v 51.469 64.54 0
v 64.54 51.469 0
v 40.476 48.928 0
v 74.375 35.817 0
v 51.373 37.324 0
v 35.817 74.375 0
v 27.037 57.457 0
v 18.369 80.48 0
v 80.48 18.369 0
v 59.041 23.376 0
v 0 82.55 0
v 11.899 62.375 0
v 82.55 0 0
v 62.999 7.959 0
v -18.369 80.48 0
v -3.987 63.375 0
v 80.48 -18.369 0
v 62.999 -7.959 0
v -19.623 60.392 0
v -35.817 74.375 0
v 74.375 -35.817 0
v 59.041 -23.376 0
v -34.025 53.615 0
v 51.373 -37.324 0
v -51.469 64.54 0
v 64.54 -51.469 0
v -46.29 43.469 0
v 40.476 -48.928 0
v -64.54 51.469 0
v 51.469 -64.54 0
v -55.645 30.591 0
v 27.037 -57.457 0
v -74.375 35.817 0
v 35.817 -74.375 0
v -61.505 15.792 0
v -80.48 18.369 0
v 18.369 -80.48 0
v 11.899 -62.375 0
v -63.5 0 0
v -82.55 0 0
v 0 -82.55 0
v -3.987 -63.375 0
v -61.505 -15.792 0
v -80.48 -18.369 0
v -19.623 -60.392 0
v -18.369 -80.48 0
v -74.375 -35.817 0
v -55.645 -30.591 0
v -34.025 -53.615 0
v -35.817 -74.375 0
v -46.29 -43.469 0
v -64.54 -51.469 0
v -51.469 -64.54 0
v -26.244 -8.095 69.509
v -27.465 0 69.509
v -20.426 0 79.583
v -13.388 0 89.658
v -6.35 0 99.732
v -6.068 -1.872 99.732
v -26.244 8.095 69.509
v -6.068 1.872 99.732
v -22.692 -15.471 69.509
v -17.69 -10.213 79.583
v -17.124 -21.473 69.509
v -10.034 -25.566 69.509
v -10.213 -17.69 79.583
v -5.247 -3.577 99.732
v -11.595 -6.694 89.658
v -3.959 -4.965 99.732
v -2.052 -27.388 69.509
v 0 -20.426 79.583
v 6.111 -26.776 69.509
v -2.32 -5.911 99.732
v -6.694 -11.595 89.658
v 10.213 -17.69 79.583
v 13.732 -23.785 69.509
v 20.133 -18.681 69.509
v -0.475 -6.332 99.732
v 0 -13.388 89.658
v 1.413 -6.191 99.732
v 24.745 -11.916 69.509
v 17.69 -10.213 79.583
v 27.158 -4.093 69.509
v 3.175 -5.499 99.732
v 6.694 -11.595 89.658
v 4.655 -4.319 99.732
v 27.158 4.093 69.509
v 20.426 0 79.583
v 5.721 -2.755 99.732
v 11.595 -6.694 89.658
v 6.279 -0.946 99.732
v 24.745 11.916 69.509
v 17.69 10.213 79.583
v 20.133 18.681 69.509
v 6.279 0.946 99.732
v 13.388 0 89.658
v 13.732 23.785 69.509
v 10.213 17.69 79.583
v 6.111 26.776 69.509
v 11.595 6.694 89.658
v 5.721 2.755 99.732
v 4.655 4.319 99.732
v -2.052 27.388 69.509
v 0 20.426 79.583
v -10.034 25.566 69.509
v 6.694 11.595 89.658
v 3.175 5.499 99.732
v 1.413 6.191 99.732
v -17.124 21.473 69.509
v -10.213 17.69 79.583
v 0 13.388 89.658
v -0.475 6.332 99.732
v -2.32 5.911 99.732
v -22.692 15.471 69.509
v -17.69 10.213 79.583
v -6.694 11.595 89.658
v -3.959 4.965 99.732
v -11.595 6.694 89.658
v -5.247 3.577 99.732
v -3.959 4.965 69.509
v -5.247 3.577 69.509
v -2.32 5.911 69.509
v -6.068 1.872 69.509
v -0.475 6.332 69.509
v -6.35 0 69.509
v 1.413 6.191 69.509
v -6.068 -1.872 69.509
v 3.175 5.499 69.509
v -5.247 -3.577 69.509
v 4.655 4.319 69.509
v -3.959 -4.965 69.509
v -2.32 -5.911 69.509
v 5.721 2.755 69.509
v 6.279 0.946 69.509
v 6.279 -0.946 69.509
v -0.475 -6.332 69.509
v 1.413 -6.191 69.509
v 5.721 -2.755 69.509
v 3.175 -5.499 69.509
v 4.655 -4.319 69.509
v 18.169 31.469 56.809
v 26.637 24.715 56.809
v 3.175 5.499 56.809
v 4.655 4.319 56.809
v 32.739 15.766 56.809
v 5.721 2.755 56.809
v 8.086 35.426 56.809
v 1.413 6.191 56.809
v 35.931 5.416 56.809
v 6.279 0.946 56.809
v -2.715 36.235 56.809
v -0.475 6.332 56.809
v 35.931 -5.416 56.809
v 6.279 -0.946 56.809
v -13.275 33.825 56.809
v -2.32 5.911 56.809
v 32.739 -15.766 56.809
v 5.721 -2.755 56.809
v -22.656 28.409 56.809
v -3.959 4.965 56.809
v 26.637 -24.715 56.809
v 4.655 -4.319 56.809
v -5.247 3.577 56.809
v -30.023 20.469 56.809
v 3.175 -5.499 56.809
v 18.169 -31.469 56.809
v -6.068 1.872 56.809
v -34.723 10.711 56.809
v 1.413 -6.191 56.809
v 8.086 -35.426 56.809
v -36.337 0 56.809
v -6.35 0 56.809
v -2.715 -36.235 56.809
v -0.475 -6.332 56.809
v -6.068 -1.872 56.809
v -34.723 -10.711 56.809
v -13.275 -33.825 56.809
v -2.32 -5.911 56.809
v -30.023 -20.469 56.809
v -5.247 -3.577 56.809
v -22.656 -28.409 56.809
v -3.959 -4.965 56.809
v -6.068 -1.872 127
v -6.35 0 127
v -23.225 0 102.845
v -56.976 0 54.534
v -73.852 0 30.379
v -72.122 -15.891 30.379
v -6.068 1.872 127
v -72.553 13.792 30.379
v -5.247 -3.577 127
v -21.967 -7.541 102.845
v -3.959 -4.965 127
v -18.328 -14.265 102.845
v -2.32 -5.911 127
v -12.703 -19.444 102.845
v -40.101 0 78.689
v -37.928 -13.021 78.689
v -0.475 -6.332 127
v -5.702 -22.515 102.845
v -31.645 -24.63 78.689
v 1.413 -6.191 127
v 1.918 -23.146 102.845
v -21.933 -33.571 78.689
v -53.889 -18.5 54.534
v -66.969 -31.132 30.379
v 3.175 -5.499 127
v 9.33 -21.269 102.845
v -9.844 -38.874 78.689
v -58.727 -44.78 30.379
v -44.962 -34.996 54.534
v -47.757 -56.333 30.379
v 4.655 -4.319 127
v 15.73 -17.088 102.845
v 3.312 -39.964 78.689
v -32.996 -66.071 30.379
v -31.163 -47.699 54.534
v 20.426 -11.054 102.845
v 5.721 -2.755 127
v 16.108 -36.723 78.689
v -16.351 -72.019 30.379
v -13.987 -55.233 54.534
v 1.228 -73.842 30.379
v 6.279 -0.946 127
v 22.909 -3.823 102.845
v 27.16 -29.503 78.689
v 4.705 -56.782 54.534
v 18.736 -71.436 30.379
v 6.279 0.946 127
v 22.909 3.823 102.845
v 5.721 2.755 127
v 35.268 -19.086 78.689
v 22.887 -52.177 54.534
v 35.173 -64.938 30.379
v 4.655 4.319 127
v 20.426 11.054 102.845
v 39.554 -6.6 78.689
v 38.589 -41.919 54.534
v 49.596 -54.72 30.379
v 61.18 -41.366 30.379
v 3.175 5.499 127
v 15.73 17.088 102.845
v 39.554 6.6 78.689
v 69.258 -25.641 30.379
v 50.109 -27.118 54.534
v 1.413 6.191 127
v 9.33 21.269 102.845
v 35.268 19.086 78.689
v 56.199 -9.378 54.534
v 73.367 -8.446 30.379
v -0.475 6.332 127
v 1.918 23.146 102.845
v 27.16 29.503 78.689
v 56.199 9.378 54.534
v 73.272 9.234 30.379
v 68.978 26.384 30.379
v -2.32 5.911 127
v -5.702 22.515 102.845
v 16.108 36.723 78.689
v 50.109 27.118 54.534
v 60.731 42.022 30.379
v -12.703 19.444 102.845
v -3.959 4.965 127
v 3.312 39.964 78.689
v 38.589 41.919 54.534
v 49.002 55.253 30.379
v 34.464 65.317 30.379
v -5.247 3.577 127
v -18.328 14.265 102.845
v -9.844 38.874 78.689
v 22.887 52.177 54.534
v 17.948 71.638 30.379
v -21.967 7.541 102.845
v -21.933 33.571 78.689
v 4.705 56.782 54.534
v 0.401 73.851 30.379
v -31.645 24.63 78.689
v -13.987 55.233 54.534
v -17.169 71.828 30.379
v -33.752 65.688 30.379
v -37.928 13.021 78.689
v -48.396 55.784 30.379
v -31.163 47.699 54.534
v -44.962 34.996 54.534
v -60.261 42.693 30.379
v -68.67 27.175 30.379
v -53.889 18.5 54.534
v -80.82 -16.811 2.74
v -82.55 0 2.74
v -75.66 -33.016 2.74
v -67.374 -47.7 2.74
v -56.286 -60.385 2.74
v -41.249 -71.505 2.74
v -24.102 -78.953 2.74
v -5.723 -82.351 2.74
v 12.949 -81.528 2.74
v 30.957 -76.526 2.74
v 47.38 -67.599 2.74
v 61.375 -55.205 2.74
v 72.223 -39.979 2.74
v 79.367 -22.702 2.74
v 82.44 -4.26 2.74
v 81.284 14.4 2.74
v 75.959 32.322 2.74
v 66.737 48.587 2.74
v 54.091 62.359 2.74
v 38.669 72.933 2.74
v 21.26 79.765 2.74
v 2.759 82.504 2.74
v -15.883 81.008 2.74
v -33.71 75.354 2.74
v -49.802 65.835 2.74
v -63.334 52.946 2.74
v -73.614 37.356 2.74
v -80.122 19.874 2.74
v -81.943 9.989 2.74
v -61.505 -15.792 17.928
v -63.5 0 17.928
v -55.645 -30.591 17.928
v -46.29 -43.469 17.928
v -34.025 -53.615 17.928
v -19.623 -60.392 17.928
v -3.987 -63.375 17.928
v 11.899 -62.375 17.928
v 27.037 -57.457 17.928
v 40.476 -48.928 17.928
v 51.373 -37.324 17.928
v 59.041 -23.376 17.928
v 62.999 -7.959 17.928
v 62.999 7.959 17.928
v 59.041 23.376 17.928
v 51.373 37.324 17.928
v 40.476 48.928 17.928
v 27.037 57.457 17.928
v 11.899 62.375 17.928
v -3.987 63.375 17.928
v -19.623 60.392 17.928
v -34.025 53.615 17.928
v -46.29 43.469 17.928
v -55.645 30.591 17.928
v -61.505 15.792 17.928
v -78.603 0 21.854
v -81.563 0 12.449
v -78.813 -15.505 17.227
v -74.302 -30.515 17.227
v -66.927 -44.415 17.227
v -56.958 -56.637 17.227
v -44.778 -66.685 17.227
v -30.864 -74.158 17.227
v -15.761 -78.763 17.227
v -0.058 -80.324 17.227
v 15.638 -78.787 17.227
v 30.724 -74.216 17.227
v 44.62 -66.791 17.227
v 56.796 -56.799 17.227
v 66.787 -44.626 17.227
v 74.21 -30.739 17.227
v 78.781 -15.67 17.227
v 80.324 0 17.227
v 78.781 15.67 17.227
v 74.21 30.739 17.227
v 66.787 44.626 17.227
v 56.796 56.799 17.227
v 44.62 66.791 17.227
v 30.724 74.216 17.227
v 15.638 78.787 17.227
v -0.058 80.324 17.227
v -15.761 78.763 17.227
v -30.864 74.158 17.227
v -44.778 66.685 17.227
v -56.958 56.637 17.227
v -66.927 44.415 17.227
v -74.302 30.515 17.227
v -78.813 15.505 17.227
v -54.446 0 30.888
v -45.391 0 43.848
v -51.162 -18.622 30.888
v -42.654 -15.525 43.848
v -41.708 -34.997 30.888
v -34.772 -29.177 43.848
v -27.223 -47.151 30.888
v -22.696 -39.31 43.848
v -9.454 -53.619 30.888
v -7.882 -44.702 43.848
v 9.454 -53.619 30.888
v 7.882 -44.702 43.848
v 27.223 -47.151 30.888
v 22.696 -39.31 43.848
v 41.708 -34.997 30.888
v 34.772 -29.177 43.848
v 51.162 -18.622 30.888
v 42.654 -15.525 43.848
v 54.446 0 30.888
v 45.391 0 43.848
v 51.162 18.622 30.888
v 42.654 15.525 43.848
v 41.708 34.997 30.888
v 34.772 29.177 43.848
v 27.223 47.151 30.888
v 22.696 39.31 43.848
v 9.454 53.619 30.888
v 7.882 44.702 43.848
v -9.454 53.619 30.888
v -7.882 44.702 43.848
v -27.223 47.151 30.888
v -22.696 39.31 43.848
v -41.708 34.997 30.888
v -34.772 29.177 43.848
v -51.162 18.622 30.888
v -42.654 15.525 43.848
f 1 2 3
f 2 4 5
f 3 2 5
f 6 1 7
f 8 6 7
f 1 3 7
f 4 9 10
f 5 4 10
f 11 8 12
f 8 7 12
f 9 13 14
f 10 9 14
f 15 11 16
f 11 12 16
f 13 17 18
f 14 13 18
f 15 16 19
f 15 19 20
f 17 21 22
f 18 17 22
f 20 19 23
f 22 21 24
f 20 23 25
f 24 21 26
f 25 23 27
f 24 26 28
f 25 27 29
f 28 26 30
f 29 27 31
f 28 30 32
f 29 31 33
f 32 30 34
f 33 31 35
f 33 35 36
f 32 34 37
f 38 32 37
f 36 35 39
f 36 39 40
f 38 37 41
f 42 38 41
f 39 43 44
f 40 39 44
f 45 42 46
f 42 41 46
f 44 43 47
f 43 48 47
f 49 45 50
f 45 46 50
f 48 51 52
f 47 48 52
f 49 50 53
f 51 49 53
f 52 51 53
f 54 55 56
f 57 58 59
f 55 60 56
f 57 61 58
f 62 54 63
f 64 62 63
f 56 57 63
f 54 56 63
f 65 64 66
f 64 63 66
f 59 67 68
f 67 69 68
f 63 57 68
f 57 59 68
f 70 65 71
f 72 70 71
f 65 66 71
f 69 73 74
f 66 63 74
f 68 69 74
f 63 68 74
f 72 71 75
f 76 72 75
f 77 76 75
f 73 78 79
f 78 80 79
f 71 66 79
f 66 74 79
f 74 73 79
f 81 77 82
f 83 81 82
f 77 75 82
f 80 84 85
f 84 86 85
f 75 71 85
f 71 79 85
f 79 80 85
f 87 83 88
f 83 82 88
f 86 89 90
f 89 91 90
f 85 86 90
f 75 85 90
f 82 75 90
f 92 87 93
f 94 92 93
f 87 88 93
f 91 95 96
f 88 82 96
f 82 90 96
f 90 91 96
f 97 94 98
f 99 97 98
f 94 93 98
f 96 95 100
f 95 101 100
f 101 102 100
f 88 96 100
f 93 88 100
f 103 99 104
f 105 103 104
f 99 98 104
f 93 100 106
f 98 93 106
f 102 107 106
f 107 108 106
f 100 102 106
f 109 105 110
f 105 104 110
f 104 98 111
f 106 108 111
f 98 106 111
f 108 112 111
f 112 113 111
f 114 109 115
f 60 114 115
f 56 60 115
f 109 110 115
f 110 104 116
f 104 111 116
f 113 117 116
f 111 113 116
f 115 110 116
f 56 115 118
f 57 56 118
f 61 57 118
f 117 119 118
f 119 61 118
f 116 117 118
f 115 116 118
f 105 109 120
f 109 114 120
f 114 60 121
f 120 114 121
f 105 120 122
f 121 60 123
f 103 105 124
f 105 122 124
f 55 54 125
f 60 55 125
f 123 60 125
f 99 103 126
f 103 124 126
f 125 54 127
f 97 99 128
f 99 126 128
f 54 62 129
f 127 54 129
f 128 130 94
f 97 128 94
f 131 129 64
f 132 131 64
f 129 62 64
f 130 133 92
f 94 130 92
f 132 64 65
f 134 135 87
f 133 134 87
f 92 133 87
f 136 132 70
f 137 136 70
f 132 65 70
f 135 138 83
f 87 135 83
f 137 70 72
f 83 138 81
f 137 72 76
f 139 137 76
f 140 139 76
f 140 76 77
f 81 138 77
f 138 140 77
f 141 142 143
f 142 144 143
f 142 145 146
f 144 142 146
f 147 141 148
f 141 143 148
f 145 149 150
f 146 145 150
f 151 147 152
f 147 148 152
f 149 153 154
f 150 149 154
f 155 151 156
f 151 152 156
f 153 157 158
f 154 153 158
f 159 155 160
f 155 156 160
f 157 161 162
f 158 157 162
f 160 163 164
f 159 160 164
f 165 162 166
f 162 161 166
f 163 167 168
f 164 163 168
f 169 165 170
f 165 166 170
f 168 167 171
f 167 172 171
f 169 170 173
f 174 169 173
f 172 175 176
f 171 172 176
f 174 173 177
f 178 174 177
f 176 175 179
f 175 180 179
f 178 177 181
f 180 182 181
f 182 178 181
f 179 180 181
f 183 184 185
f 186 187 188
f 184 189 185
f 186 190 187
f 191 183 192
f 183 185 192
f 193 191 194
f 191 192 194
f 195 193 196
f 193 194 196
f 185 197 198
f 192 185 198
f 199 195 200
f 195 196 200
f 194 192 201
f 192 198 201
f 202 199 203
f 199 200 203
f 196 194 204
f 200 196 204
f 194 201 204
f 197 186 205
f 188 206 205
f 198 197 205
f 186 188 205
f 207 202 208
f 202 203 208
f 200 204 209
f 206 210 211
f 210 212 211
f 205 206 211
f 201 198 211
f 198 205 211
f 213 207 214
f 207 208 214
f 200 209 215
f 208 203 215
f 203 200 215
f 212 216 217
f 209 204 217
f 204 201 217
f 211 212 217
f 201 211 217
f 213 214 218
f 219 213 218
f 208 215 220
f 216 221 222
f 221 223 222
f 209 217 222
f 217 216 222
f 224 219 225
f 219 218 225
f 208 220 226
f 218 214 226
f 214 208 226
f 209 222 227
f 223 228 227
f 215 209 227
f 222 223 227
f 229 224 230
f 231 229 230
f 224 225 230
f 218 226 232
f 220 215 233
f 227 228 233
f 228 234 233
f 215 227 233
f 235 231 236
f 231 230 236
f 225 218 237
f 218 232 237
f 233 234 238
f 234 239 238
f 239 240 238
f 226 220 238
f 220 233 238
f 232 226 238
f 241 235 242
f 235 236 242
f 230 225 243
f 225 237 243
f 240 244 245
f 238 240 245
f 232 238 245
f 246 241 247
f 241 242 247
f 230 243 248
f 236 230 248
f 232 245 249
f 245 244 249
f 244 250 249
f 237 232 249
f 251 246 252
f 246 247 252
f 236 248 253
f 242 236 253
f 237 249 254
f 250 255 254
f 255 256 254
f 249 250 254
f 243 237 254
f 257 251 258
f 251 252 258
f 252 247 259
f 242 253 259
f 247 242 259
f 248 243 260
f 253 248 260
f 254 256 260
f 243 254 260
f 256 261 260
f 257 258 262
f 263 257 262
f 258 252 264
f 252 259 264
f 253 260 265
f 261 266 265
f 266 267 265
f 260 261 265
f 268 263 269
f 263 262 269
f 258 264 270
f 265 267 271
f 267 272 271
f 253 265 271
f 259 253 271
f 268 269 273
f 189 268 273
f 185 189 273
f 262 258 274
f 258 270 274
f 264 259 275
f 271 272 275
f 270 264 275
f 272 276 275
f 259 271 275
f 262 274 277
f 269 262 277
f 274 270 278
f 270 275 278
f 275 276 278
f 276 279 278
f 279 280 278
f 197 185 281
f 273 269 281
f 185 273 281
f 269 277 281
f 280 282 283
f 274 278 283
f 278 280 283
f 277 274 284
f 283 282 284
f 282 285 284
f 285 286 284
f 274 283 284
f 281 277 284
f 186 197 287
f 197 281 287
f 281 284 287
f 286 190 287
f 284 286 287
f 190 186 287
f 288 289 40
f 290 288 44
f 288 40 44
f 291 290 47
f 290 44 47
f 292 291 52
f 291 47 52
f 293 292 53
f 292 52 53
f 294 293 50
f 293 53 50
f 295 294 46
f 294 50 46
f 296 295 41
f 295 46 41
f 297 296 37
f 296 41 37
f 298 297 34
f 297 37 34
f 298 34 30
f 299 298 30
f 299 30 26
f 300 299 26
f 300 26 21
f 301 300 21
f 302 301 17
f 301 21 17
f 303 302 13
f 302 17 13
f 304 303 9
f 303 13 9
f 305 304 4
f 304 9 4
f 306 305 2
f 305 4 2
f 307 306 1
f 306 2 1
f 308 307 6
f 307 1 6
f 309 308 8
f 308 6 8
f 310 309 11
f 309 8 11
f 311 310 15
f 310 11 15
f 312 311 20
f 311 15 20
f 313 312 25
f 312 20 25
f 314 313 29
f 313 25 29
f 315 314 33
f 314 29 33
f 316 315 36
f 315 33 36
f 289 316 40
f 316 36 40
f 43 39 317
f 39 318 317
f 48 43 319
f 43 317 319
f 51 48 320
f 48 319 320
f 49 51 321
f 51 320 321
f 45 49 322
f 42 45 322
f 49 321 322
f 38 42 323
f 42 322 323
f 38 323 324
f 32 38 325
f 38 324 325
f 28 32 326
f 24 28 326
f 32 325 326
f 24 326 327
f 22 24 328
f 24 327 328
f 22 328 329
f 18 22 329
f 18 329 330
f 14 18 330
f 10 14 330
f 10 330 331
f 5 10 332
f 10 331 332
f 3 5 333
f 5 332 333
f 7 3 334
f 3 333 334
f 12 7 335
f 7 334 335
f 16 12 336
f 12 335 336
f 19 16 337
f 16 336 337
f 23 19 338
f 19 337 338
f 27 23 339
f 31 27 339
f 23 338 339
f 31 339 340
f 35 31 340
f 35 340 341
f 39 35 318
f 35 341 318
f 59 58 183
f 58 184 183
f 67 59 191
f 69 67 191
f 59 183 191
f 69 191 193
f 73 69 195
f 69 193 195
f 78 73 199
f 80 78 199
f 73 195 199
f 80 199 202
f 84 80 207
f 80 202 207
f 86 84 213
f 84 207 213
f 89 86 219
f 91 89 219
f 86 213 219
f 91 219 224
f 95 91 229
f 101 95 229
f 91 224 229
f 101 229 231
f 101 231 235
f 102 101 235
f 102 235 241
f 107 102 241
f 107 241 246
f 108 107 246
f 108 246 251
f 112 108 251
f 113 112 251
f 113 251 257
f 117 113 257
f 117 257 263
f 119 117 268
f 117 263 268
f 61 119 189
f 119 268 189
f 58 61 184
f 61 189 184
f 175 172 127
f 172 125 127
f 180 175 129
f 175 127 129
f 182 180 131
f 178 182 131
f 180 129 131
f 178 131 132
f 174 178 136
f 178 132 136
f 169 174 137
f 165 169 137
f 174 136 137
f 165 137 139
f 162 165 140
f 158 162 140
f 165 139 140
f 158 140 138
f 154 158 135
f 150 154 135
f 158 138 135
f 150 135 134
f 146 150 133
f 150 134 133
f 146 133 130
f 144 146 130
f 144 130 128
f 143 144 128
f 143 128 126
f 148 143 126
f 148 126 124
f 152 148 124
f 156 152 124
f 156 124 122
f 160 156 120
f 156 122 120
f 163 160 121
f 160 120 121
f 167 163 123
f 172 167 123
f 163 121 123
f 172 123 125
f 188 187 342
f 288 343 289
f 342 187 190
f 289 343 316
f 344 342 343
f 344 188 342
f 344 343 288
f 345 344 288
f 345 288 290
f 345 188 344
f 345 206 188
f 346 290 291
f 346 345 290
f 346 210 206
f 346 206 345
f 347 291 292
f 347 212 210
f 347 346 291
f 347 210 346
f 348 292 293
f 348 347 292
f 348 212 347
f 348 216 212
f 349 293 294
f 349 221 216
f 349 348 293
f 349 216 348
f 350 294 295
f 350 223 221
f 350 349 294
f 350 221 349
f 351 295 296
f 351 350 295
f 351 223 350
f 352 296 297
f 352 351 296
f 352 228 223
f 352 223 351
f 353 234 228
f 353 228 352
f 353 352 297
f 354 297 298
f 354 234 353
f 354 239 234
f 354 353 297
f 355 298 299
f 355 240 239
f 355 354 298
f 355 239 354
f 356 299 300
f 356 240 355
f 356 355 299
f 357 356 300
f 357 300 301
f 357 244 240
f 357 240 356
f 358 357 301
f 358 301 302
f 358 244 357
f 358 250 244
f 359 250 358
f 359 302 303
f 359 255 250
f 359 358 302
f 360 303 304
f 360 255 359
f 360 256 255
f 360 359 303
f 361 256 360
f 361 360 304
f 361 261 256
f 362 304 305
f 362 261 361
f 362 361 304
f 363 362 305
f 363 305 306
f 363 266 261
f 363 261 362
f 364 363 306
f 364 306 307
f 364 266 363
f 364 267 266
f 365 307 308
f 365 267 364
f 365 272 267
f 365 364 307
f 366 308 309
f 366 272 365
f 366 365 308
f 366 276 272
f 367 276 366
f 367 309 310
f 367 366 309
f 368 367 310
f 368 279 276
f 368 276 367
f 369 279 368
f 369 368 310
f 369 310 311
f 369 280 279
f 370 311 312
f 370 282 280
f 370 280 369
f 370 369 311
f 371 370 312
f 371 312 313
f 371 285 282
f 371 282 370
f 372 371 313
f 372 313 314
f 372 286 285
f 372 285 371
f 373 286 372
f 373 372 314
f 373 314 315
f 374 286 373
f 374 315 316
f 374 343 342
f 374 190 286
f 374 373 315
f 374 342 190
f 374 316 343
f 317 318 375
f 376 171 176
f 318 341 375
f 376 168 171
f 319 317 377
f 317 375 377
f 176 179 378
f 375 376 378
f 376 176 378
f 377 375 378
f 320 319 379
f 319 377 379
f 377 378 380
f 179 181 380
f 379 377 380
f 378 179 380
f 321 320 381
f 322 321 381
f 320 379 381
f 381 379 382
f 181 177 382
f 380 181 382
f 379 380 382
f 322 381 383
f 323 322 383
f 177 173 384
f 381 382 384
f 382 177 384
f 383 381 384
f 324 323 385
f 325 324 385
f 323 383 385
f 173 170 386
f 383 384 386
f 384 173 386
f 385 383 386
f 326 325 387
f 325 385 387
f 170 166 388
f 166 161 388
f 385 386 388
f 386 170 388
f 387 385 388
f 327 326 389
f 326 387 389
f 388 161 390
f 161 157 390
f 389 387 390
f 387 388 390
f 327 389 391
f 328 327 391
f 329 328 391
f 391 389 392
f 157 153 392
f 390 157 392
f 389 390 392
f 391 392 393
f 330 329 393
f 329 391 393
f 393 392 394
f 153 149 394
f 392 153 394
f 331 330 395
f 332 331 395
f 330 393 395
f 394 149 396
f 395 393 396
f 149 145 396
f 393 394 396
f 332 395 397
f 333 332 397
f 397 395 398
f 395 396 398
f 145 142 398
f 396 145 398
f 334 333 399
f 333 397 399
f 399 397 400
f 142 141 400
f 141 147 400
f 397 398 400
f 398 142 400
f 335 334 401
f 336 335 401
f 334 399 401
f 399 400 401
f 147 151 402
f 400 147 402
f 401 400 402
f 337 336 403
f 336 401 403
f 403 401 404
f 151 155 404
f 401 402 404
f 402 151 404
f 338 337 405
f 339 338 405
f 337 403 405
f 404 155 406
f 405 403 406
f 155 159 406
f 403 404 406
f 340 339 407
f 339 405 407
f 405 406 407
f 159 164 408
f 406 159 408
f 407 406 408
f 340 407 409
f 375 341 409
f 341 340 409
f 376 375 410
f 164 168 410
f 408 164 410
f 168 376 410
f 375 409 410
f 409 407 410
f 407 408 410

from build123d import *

# Parameters (mm, degrees)
FILLET1_R = 48.26


with BuildPart() as part:
    # Sketch2 → Revolve1 (revolve)
    with BuildSketch(Plane.YZ, mode=Mode.PRIVATE) as revolve1_sk:
        Polygon((-63.5, 0), (-63.5, 17.927965037), (-36.337085401, 56.808731059), (-6.35, 56.808731059), (-6.35, 69.508731059), (-27.464600347, 69.508731059), (-6.35, 99.731991259), (-6.35, 127), (-82.55, 17.927965037), (-82.55, 0), align=None)
    revolve(revolve1_sk.sketch.rotate(Axis((0, 0, 0), (0, 0, 1)), 270), axis=Axis((0, 0, 0), (0, 0, 1)))

    # Fillet1
    fillet1_edges = [part.edges().sort_by_distance(p)[0] for p in [
        (82.55, 0, 17.927965037),
    ]]
    fillet(fillet1_edges, radius=FILLET1_R)


solid = part.part
